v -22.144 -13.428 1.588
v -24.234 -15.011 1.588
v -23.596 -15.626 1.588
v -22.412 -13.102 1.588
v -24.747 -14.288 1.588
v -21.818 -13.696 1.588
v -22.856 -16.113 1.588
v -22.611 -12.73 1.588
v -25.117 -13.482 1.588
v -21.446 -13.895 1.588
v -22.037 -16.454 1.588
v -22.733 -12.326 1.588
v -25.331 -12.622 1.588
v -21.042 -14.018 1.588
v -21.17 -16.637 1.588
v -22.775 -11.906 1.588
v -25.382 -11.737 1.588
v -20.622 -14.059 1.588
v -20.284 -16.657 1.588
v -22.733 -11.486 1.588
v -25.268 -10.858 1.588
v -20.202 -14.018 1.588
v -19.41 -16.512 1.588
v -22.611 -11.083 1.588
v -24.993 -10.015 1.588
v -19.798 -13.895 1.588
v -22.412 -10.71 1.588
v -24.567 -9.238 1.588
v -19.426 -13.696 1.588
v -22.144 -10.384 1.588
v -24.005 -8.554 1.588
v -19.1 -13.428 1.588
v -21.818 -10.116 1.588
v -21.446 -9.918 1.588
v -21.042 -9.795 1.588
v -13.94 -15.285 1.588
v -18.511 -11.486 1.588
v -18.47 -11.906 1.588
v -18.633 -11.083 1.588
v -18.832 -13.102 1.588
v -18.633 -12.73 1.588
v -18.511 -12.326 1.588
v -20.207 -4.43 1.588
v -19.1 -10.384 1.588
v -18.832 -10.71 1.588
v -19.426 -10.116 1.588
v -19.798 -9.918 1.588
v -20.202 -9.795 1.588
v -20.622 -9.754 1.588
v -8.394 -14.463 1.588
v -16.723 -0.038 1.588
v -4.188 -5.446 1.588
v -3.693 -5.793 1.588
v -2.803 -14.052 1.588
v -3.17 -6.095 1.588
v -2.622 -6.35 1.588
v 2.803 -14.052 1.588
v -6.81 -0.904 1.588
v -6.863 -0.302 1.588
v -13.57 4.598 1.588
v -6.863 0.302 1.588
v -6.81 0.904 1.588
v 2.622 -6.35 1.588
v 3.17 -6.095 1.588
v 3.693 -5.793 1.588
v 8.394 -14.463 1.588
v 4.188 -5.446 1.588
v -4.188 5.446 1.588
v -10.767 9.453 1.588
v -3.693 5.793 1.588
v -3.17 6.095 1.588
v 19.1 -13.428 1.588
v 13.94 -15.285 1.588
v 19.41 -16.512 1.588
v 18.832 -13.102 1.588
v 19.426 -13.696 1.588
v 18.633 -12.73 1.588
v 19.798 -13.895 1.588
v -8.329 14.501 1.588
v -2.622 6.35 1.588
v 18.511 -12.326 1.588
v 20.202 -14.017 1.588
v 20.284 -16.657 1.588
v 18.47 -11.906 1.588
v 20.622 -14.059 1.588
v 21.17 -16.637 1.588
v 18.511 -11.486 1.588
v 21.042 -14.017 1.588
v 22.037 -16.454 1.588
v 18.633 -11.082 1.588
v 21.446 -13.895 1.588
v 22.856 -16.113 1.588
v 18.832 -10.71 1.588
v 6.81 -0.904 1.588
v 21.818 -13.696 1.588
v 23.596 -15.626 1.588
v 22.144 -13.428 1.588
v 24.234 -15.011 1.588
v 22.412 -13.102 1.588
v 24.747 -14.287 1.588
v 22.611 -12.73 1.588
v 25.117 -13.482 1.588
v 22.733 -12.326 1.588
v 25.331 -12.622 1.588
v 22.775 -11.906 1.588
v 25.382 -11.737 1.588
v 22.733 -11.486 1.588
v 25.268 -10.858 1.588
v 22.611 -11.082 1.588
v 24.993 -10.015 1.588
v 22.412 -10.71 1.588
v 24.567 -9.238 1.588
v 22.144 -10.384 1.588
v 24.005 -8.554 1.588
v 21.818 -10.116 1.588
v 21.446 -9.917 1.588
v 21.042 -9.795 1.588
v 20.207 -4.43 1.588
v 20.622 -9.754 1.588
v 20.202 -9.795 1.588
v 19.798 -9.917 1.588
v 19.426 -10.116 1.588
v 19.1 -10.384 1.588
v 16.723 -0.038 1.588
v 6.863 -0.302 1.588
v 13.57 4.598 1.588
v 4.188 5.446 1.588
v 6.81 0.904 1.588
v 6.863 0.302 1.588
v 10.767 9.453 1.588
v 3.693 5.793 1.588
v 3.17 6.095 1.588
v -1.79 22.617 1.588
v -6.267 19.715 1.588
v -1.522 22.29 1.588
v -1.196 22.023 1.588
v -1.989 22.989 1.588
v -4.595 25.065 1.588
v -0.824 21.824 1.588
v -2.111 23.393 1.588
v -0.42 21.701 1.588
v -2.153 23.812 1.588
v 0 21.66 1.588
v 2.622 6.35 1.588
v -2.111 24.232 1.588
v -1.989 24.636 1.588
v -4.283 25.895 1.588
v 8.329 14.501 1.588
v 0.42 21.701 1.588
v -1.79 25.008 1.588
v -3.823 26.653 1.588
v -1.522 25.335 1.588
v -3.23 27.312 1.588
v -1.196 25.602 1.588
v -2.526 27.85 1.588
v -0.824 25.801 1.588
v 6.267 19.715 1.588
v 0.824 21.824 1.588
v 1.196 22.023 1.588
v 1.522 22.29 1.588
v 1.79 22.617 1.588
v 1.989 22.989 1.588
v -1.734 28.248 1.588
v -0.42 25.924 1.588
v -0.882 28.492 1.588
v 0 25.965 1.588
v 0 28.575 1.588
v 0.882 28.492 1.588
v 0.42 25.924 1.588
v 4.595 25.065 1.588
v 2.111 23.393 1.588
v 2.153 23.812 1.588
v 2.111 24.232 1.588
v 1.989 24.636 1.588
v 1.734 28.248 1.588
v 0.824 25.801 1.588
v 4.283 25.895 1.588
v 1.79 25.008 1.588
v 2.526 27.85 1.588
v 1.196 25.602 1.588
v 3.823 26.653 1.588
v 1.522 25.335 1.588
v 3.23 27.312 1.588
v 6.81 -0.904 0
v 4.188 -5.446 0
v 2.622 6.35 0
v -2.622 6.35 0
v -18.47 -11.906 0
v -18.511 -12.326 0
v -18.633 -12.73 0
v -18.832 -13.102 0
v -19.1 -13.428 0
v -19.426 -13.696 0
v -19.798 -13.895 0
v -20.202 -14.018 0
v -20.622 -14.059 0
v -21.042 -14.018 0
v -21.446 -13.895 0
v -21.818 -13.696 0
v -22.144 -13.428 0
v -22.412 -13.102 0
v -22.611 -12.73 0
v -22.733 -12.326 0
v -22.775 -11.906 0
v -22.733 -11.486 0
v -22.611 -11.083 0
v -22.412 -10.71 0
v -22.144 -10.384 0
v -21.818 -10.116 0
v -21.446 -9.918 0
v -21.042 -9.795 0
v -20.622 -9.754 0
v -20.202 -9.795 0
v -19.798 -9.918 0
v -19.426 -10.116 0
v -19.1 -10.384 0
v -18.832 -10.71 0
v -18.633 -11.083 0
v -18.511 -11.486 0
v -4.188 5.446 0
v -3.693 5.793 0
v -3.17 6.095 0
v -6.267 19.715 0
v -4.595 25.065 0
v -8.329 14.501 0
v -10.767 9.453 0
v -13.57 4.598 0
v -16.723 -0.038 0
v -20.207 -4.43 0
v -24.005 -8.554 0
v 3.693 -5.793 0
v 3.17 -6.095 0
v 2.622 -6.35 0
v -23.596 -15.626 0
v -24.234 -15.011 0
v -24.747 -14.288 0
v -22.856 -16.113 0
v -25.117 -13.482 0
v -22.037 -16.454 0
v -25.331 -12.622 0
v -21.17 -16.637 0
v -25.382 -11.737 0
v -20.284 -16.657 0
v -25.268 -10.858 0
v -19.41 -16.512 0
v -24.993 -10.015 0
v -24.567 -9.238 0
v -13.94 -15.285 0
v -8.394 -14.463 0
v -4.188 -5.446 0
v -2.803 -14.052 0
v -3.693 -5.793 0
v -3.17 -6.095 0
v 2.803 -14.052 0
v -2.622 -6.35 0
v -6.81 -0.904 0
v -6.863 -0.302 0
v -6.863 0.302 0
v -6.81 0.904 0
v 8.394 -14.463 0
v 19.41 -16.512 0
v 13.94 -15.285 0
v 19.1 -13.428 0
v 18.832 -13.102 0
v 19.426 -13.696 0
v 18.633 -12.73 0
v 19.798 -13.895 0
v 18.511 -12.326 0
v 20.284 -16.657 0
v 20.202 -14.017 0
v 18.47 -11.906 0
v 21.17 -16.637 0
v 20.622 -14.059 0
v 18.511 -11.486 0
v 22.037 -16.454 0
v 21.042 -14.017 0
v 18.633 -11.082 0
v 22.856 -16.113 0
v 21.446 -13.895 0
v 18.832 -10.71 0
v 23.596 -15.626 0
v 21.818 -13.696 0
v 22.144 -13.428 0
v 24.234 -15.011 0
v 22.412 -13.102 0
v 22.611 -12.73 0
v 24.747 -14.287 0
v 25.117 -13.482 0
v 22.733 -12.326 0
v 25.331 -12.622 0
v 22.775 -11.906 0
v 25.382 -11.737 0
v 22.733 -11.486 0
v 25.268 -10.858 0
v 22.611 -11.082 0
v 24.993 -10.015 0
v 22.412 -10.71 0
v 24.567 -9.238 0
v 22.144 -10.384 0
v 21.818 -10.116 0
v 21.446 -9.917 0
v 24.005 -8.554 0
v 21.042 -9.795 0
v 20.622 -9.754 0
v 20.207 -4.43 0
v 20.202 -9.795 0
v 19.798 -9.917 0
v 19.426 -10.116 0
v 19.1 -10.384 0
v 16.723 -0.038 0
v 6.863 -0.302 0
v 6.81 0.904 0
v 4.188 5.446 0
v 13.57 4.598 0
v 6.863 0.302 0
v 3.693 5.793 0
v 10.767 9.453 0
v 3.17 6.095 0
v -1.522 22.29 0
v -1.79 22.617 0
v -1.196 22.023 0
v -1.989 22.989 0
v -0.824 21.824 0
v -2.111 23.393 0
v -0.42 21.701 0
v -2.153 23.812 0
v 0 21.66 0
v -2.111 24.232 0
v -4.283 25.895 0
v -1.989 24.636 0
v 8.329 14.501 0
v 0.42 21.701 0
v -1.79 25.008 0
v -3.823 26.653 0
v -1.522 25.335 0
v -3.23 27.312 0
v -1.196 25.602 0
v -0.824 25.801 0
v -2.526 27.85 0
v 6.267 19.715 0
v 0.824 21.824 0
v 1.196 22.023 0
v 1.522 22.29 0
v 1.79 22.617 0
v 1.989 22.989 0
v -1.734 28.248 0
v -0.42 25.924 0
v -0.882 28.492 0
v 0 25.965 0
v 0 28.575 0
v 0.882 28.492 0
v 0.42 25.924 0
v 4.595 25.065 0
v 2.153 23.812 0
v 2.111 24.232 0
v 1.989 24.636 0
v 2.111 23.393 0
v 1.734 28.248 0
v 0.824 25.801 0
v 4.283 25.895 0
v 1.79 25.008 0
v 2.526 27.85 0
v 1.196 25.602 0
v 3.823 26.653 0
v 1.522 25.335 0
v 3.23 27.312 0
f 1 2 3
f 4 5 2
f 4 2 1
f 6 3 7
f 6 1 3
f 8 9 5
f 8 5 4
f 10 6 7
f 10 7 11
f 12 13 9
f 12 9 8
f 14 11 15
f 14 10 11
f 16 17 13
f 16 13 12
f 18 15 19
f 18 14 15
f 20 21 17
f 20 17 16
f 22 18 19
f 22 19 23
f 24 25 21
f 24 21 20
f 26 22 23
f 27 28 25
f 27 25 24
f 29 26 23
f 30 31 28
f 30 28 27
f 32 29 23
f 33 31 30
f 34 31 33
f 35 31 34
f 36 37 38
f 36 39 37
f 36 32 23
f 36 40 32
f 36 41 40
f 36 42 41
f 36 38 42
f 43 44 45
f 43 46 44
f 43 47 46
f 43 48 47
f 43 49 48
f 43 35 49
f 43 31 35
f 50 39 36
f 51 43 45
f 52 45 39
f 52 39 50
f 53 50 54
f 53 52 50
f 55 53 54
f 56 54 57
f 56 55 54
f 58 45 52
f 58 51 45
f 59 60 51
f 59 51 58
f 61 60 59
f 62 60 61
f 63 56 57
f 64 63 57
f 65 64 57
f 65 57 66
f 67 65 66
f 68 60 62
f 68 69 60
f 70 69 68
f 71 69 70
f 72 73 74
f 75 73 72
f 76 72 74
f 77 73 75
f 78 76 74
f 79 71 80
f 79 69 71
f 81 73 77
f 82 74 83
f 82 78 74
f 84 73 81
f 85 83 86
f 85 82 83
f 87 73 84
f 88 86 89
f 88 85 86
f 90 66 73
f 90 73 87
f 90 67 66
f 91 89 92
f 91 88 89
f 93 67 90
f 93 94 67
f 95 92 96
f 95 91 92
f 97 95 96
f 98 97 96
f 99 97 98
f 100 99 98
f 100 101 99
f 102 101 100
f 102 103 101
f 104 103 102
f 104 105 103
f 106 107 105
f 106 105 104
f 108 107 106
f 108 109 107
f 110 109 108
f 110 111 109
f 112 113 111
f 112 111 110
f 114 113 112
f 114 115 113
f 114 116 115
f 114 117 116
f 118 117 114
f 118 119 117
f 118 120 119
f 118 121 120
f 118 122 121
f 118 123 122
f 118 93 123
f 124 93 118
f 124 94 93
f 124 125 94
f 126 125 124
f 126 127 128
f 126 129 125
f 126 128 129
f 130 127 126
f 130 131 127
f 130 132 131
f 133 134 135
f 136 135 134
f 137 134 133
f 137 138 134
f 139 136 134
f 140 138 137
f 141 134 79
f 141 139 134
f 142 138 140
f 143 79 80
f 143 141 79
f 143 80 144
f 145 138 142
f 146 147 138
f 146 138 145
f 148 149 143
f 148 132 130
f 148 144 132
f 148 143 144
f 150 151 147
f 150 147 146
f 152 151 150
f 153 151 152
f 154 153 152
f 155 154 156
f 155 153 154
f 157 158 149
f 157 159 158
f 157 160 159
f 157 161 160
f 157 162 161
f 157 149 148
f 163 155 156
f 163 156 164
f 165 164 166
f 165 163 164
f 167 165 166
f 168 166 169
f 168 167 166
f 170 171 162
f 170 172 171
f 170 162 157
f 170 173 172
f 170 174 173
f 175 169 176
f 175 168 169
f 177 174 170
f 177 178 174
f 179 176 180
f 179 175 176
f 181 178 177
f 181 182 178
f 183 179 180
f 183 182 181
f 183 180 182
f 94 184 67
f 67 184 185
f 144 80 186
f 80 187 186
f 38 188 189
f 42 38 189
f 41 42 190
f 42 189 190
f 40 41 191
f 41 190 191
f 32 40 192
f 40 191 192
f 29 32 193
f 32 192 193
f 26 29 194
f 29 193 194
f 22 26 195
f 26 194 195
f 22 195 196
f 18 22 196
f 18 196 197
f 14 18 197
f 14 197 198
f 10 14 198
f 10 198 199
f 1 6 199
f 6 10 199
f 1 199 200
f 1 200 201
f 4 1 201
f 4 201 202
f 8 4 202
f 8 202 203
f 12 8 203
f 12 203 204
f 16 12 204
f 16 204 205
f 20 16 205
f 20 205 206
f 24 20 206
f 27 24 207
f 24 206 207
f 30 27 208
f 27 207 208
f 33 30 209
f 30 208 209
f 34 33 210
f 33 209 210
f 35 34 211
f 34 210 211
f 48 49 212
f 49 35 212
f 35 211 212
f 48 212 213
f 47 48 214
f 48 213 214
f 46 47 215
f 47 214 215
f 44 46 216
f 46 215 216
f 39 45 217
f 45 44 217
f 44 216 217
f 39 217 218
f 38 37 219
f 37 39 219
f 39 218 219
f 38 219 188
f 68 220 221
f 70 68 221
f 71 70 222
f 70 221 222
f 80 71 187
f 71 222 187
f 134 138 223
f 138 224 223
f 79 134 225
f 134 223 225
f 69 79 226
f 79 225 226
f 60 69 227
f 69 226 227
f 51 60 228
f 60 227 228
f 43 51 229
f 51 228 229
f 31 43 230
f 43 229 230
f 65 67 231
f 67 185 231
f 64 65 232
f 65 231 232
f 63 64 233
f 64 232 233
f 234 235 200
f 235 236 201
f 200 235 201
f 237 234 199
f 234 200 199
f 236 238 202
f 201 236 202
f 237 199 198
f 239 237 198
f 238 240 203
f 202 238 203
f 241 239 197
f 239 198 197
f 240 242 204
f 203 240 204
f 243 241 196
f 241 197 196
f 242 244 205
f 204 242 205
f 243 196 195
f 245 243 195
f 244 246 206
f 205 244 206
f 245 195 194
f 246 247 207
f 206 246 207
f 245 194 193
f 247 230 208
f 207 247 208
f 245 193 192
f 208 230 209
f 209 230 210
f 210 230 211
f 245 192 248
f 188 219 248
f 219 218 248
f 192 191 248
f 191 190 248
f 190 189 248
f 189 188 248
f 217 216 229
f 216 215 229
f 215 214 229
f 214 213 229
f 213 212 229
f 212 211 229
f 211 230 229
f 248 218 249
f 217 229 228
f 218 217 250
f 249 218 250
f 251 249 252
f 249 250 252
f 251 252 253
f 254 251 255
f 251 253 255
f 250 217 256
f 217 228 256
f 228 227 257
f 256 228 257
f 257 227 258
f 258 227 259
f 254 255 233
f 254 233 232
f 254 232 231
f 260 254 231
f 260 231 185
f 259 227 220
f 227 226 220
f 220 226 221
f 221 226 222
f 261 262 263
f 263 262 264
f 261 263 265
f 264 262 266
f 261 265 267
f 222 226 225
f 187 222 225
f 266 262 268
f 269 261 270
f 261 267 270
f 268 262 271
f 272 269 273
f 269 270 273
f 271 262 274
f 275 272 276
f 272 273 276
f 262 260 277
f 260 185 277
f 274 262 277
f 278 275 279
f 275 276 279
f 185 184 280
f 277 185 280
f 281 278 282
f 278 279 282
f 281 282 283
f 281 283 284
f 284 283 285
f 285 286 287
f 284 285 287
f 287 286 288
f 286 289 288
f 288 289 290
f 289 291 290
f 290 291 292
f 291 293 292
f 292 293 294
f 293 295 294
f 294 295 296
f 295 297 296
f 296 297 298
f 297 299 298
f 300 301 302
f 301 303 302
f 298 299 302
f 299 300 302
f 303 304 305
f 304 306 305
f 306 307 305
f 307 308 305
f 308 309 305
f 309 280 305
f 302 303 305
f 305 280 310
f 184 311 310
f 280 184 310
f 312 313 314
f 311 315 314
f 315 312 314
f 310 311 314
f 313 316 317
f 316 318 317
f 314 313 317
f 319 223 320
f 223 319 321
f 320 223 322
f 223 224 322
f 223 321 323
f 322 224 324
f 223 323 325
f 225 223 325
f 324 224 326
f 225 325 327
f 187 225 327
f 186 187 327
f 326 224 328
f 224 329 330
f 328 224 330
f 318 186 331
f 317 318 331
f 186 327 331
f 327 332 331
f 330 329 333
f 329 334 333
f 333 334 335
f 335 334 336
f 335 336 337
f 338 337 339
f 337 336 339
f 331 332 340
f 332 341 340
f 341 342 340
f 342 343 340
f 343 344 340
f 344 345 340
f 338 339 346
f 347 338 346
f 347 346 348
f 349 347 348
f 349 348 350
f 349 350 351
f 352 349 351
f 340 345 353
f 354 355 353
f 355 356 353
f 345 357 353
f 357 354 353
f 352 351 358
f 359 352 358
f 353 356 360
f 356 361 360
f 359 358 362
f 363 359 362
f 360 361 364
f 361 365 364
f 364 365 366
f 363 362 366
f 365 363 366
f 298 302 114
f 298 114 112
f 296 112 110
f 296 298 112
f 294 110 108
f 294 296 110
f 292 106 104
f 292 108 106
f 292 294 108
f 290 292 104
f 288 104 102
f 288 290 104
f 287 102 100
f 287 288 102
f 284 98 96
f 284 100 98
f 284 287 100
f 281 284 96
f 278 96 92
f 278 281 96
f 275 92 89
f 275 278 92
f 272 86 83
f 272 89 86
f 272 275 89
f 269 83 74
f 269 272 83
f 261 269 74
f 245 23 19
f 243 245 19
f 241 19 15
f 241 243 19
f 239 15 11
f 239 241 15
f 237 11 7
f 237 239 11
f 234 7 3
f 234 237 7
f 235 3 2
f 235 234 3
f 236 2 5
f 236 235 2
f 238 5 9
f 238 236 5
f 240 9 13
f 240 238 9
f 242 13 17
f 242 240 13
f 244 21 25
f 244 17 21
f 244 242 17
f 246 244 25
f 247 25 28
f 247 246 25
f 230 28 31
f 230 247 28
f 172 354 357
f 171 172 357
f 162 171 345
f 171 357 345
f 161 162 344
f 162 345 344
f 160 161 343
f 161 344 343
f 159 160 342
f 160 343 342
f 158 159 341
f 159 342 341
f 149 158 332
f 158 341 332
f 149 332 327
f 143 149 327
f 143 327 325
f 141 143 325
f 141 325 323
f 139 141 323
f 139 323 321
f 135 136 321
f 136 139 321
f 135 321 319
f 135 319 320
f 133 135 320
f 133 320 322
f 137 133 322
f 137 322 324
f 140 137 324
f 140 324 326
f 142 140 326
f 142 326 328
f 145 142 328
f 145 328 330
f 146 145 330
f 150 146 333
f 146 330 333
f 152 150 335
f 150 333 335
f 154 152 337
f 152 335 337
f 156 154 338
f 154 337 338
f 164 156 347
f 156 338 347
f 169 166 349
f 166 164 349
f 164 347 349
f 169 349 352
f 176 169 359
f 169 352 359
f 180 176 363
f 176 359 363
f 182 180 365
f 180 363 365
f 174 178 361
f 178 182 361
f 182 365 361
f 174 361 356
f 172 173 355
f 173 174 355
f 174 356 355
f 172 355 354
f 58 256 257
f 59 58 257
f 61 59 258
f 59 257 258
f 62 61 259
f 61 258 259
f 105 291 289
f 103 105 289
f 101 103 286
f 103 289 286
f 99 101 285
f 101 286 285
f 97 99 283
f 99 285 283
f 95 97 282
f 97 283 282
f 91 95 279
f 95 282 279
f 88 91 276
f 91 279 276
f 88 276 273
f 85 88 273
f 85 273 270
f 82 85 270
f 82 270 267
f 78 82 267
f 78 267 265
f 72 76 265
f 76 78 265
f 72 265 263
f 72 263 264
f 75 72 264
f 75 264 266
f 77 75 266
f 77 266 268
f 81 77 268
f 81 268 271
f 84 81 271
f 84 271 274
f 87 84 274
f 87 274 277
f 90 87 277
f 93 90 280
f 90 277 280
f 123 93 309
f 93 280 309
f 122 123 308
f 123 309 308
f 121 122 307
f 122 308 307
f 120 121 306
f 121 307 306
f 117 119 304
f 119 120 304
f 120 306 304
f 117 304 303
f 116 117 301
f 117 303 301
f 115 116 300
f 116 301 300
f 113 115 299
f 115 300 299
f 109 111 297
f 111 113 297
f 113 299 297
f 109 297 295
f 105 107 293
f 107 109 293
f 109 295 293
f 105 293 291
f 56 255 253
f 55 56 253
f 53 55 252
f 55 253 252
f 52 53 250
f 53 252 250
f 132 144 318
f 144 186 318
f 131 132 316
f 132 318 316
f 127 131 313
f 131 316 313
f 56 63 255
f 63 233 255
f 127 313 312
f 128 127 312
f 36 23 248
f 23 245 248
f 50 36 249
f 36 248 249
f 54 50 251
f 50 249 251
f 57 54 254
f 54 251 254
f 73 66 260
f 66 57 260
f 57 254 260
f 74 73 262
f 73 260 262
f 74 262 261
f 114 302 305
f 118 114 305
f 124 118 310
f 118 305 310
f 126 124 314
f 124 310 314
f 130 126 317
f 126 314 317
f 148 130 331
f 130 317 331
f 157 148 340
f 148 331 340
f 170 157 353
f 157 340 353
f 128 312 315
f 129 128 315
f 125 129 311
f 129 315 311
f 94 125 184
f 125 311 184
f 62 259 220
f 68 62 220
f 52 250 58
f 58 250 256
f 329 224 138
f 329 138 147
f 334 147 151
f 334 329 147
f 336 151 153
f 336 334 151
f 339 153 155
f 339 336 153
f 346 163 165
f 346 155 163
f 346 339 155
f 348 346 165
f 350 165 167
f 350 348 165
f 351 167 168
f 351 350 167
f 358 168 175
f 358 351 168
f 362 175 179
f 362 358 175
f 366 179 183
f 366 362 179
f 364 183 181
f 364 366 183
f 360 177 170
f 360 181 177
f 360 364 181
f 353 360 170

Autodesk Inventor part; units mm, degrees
ref_plane "YZ Plane" through (0, 0, 0) normal (1, 0, 0) x (0, 1, 0)
ref_plane "XZ Plane" through (0, 0, 0) normal (0, 1, 0) x (-1, 0, 0)
ref_plane "XY Plane" through (0, 0, 0) normal (0, 0, 1) x (1, 0, 0)
sketch "VersaHex Adapter Hole" plane through (0, 0, 0) normal (0, 0, 1) x (1, 0, 0)
  line L0 (-2.6931, -2.4859) -> (-0.0712, 2.0554)
  arc A0 (1.4952, 2.9597) -> (-0.0712, 2.0554) centre (4.1171, -3.3903) ccw
  line L1 (1.4952, 2.9597) -> (6.7391, 2.9597)
  arc A1 (8.3055, 2.0554) -> (6.7391, 2.9597) centre (4.1171, -3.3903) ccw
  line L2 (8.3055, 2.0554) -> (10.9274, -2.4859)
  arc A2 (10.9274, -4.2946) -> (10.9274, -2.4859) centre (4.1171, -3.3903) ccw
  line L3 (10.9274, -4.2946) -> (8.3055, -8.8359)
  arc A3 (6.7391, -9.7403) -> (8.3055, -8.8359) centre (4.1171, -3.3903) ccw
  line L4 (6.7391, -9.7403) -> (1.4952, -9.7403)
  arc A4 (-0.0712, -8.8359) -> (1.4952, -9.7403) centre (4.1171, -3.3903) ccw
  line L5 (-0.0712, -8.8359) -> (-2.6931, -4.2946)
  arc A5 (-2.6931, -2.4859) -> (-2.6931, -4.2946) centre (4.1171, -3.3903) ccw
  point P0 (3.8427, -3.1642)
  point P1 (0, 3.175)
  point P2 (0, -3.175)
  point P3 (0, 0)
sketch "Block2" plane through (0, 0, 0) normal (0, 0, 1) x (1, 0, 0)
  line L0 (30.4112, -18.6542) -> (33.0331, -14.1129)
  arc A0 (34.5995, -13.2085) -> (33.0331, -14.1129) centre (37.2214, -19.5585) ccw
  line L1 (34.5995, -13.2085) -> (39.8433, -13.2085)
  arc A1 (41.4097, -14.1129) -> (39.8433, -13.2085) centre (37.2214, -19.5585) ccw
  line L2 (41.4097, -14.1129) -> (44.0316, -18.6542)
  arc A2 (44.0316, -20.4629) -> (44.0316, -18.6542) centre (37.2214, -19.5585) ccw
  line L3 (44.0316, -20.4629) -> (41.4097, -25.0042)
  arc A3 (39.8433, -25.9085) -> (41.4097, -25.0042) centre (37.2214, -19.5585) ccw
  line L4 (39.8433, -25.9085) -> (34.5995, -25.9085)
  arc A4 (33.0331, -25.0042) -> (34.5995, -25.9085) centre (37.2214, -19.5585) ccw
  line L5 (33.0331, -25.0042) -> (30.4112, -20.4629)
  arc A5 (30.4112, -18.6542) -> (30.4112, -20.4629) centre (37.2214, -19.5585) ccw
  point P0 (37.2214, -19.5585)
sketch "Sketch1" plane through (0, 0, 0) normal (0, 0, 1) x (1, 0, 0)
  circle A0 centre (-20.6222, -11.9063) radius 2.1526
  circle A1 centre (20.6222, -11.9062) radius 2.1526
  circle A2 centre (0, 23.8125) radius 2.1526
  arc A3 (-24.0046, -8.5535) -> (-19.4099, -16.5119) centre (-20.6222, -11.9063) ccw
  arc A4 (19.4099, -16.5119) -> (24.0046, -8.5535) centre (20.6222, -11.9062) ccw
  arc A5 (4.5947, 25.0654) -> (-4.5947, 25.0654) centre (0, 23.8125) ccw
  arc A6 (19.4099, -16.5119) -> (-19.4099, -16.5119) centre (0, -90.2489) ccw
  arc A7 (-24.0046, -8.5535) -> (-4.5947, 25.0654) centre (-78.1579, 45.1245) ccw
  arc A8 (4.5947, 25.0654) -> (24.0046, -8.5535) centre (78.1579, 45.1245) ccw
  line L0 (-6.8102, 0.9044) -> (-4.1883, 5.4456)
  arc A9 (-2.6219, 6.35) -> (-4.1883, 5.4456) centre (0, 0) ccw
  line L1 (-2.6219, 6.35) -> (2.6219, 6.35)
  arc A10 (4.1883, 5.4456) -> (2.6219, 6.35) centre (0, 0) ccw
  line L2 (4.1883, 5.4456) -> (6.8102, 0.9044)
  arc A11 (6.8102, -0.9044) -> (6.8102, 0.9044) centre (0, 0) ccw
  line L3 (6.8102, -0.9044) -> (4.1883, -5.4456)
  arc A12 (2.6219, -6.35) -> (4.1883, -5.4456) centre (0, 0) ccw
  line L4 (2.6219, -6.35) -> (-2.6219, -6.35)
  arc A13 (-4.1883, -5.4456) -> (-2.6219, -6.35) centre (0, 0) ccw
  line L5 (-4.1883, -5.4456) -> (-6.8102, -0.9044)
  arc A14 (-6.8102, 0.9044) -> (-6.8102, -0.9044) centre (0, 0) ccw
  dimension "d5" = 9.525
  dimension "d6" = 9.525
  dimension "d7" = 9.525
extrude "Extrusion1" add sketch "Sketch1" along normal blind 1.5875
equation "\"BendRadius\" = Thickness"
equation "\"BendReliefWidth\" = Thickness"
equation "\"BendReliefDepth\" = 0.5 * Thickness"
equation "\"CornerReliefSize\" = 4 * Thickness"
equation "\"MinimumRemnant\" = 2 * Thickness"
equation "\"TransitionRadius\" = BendRadius"
equation "\"JacobiRadiusSize\" = BendRadius"
equation "\"GapSize\" = Thickness"
equation "\"Thickness\" = 1.5875"
properties part number "flex_wheel_hub" material "Acetal Resin, White"
